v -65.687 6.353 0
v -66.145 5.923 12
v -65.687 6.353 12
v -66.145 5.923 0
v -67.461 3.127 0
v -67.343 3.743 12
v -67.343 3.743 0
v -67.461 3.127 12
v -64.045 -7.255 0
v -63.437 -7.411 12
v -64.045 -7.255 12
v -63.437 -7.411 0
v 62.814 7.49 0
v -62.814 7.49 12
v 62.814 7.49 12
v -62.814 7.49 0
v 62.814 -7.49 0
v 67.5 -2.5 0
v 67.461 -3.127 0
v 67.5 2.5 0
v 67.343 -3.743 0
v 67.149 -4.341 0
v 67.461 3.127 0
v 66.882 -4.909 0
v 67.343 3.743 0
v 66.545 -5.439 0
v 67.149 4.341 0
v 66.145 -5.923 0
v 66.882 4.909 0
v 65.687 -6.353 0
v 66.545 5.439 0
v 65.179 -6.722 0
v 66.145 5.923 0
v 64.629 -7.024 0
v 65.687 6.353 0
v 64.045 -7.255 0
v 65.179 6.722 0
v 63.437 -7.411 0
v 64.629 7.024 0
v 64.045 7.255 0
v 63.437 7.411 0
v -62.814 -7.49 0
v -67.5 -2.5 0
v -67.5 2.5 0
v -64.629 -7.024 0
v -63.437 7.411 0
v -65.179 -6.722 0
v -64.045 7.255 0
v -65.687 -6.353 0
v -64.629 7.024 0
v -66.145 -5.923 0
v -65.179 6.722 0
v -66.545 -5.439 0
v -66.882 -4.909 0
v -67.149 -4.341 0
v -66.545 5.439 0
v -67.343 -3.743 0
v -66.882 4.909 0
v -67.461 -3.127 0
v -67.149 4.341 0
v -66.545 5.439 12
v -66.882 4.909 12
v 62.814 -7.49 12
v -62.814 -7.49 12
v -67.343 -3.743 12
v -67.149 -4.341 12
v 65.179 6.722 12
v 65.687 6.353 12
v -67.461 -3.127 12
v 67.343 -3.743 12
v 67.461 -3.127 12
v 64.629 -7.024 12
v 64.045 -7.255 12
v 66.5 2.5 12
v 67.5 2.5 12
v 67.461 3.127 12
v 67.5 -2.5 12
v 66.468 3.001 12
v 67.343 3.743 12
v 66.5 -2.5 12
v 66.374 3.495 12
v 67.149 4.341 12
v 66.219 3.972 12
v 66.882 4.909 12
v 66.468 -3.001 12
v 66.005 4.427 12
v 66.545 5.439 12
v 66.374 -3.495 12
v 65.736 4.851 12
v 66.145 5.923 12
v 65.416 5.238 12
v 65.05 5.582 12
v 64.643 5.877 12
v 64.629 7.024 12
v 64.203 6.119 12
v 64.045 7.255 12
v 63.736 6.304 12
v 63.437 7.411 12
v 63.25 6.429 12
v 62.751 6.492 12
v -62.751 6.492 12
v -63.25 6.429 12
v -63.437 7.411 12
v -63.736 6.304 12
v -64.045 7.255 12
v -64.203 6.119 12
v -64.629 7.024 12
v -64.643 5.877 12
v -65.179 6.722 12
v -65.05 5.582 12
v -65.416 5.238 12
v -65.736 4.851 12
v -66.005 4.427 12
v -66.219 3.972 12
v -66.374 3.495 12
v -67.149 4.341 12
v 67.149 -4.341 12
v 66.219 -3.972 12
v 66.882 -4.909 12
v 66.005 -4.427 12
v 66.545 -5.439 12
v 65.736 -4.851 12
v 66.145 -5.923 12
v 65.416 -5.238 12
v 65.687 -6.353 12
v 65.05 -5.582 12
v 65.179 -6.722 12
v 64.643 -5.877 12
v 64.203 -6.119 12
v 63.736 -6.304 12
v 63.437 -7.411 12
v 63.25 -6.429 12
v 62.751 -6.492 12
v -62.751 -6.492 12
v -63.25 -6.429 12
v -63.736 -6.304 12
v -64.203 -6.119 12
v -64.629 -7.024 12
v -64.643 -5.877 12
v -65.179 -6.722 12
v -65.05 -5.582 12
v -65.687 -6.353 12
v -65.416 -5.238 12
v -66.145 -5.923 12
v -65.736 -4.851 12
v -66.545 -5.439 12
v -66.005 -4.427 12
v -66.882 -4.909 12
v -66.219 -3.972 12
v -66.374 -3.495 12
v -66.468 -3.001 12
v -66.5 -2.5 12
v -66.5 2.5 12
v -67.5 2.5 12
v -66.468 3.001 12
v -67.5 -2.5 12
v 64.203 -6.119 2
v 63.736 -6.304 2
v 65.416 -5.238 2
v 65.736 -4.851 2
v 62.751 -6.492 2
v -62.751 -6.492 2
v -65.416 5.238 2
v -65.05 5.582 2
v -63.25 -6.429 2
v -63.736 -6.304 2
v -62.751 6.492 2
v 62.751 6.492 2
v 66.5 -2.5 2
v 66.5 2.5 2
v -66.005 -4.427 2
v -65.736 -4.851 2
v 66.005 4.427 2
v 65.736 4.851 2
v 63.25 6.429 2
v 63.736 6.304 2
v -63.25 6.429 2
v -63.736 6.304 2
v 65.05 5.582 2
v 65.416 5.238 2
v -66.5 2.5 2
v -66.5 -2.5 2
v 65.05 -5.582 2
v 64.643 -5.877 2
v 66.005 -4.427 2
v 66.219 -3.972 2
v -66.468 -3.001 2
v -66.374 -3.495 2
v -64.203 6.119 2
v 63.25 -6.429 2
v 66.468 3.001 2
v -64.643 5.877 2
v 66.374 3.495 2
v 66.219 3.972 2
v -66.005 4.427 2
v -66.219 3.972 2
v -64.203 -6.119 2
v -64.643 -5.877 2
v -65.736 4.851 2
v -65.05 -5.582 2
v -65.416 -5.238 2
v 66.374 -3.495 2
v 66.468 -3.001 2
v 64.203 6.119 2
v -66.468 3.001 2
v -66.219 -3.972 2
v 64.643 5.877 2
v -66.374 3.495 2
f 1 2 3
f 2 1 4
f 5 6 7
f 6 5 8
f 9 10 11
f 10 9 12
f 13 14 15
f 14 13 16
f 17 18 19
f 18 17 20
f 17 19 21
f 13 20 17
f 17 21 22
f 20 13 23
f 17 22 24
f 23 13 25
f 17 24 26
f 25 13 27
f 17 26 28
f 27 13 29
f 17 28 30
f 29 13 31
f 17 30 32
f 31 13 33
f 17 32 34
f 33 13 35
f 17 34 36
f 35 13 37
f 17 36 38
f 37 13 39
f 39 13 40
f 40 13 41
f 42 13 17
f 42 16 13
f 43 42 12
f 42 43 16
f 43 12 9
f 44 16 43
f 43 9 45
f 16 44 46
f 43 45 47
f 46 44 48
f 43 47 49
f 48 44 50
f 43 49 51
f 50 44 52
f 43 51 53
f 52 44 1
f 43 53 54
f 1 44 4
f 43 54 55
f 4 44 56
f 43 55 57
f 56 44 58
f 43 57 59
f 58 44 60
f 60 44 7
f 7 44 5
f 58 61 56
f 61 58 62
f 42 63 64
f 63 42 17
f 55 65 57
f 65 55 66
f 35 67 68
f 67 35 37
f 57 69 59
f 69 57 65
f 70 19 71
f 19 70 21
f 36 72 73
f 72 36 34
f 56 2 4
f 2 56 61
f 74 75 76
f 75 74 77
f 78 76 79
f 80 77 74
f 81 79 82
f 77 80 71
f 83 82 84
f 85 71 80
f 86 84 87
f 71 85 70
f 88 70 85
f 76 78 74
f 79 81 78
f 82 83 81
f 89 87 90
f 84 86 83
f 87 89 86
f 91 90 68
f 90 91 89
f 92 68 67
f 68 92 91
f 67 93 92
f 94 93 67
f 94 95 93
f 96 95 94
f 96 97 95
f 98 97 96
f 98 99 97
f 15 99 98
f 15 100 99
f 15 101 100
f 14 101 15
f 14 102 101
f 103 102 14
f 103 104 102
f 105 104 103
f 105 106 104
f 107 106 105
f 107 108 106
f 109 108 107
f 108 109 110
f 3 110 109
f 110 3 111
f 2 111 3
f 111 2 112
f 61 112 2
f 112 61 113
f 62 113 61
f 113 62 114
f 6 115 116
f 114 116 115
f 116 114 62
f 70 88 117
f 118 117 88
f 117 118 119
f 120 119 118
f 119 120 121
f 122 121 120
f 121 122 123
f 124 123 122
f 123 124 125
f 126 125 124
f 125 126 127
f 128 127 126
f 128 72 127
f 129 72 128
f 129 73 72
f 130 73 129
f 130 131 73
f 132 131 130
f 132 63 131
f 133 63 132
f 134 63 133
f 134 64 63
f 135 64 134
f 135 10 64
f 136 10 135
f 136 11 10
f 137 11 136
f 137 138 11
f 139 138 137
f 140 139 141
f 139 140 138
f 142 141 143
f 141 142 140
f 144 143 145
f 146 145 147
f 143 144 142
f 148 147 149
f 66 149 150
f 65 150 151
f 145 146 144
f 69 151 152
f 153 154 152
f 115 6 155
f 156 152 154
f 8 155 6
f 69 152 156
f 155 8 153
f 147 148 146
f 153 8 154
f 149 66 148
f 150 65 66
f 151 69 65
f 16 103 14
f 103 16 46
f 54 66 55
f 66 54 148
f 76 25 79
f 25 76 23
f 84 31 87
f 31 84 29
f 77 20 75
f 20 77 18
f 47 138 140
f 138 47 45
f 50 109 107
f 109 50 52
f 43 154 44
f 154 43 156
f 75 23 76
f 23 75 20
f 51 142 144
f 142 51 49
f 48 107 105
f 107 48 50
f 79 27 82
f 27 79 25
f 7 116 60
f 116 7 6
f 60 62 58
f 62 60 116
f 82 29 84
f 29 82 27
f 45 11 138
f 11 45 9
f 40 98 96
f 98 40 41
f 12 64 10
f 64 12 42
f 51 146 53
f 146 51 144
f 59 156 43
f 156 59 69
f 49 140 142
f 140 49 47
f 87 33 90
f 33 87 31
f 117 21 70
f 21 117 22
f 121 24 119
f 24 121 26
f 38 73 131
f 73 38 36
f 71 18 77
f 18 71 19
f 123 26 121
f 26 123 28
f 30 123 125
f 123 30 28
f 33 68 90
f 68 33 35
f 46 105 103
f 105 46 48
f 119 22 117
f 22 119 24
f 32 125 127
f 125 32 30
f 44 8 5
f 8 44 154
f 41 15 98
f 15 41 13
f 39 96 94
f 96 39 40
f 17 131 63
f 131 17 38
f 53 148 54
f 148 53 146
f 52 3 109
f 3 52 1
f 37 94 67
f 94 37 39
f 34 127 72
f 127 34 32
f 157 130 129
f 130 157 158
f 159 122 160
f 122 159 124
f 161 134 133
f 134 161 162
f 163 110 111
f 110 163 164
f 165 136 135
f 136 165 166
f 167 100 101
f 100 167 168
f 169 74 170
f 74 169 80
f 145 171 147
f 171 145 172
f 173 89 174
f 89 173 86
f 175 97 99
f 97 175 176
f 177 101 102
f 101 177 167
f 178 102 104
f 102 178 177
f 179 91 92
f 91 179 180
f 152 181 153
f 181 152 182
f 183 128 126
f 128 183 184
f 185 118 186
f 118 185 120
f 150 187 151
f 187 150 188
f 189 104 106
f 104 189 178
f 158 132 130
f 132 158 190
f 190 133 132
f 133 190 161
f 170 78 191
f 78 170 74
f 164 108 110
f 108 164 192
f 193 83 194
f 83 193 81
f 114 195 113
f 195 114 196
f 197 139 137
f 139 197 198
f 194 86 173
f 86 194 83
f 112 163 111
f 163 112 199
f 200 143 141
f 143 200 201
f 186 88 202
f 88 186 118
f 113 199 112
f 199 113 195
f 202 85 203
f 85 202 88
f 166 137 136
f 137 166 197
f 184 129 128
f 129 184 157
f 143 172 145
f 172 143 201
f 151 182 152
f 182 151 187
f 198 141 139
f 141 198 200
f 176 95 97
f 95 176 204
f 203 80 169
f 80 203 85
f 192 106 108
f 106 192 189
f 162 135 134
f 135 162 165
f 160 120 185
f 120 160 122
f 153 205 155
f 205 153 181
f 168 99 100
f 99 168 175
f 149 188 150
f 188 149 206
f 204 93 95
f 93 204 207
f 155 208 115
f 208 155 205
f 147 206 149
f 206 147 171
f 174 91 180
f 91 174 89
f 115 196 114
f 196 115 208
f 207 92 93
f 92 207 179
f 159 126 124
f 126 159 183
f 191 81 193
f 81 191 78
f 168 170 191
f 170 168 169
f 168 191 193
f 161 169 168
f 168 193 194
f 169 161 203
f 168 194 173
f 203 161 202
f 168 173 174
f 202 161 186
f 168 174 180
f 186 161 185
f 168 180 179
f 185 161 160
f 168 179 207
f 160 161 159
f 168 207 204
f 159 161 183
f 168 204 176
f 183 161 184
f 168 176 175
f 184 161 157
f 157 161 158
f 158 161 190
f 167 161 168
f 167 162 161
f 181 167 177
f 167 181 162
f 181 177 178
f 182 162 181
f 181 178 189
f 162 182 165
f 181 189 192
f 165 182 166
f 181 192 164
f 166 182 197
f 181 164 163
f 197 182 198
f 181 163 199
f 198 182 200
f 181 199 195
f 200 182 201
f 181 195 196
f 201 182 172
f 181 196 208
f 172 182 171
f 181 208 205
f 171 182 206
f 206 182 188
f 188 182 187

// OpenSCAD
$fn = 50;


difference() {
	union() {
		hull() {
			translate(v = [-62.5000000000, 2.5000000000, 0]) {
				cylinder(h = 12, r = 5);
			}
			translate(v = [62.5000000000, 2.5000000000, 0]) {
				cylinder(h = 12, r = 5);
			}
			translate(v = [-62.5000000000, -2.5000000000, 0]) {
				cylinder(h = 12, r = 5);
			}
			translate(v = [62.5000000000, -2.5000000000, 0]) {
				cylinder(h = 12, r = 5);
			}
		}
	}
	union() {
		translate(v = [0, 0, 2]) {
			hull() {
				translate(v = [-62.5000000000, 2.5000000000, 0]) {
					cylinder(h = 10, r = 4);
				}
				translate(v = [62.5000000000, 2.5000000000, 0]) {
					cylinder(h = 10, r = 4);
				}
				translate(v = [-62.5000000000, -2.5000000000, 0]) {
					cylinder(h = 10, r = 4);
				}
				translate(v = [62.5000000000, -2.5000000000, 0]) {
					cylinder(h = 10, r = 4);
				}
			}
		}
	}
}
